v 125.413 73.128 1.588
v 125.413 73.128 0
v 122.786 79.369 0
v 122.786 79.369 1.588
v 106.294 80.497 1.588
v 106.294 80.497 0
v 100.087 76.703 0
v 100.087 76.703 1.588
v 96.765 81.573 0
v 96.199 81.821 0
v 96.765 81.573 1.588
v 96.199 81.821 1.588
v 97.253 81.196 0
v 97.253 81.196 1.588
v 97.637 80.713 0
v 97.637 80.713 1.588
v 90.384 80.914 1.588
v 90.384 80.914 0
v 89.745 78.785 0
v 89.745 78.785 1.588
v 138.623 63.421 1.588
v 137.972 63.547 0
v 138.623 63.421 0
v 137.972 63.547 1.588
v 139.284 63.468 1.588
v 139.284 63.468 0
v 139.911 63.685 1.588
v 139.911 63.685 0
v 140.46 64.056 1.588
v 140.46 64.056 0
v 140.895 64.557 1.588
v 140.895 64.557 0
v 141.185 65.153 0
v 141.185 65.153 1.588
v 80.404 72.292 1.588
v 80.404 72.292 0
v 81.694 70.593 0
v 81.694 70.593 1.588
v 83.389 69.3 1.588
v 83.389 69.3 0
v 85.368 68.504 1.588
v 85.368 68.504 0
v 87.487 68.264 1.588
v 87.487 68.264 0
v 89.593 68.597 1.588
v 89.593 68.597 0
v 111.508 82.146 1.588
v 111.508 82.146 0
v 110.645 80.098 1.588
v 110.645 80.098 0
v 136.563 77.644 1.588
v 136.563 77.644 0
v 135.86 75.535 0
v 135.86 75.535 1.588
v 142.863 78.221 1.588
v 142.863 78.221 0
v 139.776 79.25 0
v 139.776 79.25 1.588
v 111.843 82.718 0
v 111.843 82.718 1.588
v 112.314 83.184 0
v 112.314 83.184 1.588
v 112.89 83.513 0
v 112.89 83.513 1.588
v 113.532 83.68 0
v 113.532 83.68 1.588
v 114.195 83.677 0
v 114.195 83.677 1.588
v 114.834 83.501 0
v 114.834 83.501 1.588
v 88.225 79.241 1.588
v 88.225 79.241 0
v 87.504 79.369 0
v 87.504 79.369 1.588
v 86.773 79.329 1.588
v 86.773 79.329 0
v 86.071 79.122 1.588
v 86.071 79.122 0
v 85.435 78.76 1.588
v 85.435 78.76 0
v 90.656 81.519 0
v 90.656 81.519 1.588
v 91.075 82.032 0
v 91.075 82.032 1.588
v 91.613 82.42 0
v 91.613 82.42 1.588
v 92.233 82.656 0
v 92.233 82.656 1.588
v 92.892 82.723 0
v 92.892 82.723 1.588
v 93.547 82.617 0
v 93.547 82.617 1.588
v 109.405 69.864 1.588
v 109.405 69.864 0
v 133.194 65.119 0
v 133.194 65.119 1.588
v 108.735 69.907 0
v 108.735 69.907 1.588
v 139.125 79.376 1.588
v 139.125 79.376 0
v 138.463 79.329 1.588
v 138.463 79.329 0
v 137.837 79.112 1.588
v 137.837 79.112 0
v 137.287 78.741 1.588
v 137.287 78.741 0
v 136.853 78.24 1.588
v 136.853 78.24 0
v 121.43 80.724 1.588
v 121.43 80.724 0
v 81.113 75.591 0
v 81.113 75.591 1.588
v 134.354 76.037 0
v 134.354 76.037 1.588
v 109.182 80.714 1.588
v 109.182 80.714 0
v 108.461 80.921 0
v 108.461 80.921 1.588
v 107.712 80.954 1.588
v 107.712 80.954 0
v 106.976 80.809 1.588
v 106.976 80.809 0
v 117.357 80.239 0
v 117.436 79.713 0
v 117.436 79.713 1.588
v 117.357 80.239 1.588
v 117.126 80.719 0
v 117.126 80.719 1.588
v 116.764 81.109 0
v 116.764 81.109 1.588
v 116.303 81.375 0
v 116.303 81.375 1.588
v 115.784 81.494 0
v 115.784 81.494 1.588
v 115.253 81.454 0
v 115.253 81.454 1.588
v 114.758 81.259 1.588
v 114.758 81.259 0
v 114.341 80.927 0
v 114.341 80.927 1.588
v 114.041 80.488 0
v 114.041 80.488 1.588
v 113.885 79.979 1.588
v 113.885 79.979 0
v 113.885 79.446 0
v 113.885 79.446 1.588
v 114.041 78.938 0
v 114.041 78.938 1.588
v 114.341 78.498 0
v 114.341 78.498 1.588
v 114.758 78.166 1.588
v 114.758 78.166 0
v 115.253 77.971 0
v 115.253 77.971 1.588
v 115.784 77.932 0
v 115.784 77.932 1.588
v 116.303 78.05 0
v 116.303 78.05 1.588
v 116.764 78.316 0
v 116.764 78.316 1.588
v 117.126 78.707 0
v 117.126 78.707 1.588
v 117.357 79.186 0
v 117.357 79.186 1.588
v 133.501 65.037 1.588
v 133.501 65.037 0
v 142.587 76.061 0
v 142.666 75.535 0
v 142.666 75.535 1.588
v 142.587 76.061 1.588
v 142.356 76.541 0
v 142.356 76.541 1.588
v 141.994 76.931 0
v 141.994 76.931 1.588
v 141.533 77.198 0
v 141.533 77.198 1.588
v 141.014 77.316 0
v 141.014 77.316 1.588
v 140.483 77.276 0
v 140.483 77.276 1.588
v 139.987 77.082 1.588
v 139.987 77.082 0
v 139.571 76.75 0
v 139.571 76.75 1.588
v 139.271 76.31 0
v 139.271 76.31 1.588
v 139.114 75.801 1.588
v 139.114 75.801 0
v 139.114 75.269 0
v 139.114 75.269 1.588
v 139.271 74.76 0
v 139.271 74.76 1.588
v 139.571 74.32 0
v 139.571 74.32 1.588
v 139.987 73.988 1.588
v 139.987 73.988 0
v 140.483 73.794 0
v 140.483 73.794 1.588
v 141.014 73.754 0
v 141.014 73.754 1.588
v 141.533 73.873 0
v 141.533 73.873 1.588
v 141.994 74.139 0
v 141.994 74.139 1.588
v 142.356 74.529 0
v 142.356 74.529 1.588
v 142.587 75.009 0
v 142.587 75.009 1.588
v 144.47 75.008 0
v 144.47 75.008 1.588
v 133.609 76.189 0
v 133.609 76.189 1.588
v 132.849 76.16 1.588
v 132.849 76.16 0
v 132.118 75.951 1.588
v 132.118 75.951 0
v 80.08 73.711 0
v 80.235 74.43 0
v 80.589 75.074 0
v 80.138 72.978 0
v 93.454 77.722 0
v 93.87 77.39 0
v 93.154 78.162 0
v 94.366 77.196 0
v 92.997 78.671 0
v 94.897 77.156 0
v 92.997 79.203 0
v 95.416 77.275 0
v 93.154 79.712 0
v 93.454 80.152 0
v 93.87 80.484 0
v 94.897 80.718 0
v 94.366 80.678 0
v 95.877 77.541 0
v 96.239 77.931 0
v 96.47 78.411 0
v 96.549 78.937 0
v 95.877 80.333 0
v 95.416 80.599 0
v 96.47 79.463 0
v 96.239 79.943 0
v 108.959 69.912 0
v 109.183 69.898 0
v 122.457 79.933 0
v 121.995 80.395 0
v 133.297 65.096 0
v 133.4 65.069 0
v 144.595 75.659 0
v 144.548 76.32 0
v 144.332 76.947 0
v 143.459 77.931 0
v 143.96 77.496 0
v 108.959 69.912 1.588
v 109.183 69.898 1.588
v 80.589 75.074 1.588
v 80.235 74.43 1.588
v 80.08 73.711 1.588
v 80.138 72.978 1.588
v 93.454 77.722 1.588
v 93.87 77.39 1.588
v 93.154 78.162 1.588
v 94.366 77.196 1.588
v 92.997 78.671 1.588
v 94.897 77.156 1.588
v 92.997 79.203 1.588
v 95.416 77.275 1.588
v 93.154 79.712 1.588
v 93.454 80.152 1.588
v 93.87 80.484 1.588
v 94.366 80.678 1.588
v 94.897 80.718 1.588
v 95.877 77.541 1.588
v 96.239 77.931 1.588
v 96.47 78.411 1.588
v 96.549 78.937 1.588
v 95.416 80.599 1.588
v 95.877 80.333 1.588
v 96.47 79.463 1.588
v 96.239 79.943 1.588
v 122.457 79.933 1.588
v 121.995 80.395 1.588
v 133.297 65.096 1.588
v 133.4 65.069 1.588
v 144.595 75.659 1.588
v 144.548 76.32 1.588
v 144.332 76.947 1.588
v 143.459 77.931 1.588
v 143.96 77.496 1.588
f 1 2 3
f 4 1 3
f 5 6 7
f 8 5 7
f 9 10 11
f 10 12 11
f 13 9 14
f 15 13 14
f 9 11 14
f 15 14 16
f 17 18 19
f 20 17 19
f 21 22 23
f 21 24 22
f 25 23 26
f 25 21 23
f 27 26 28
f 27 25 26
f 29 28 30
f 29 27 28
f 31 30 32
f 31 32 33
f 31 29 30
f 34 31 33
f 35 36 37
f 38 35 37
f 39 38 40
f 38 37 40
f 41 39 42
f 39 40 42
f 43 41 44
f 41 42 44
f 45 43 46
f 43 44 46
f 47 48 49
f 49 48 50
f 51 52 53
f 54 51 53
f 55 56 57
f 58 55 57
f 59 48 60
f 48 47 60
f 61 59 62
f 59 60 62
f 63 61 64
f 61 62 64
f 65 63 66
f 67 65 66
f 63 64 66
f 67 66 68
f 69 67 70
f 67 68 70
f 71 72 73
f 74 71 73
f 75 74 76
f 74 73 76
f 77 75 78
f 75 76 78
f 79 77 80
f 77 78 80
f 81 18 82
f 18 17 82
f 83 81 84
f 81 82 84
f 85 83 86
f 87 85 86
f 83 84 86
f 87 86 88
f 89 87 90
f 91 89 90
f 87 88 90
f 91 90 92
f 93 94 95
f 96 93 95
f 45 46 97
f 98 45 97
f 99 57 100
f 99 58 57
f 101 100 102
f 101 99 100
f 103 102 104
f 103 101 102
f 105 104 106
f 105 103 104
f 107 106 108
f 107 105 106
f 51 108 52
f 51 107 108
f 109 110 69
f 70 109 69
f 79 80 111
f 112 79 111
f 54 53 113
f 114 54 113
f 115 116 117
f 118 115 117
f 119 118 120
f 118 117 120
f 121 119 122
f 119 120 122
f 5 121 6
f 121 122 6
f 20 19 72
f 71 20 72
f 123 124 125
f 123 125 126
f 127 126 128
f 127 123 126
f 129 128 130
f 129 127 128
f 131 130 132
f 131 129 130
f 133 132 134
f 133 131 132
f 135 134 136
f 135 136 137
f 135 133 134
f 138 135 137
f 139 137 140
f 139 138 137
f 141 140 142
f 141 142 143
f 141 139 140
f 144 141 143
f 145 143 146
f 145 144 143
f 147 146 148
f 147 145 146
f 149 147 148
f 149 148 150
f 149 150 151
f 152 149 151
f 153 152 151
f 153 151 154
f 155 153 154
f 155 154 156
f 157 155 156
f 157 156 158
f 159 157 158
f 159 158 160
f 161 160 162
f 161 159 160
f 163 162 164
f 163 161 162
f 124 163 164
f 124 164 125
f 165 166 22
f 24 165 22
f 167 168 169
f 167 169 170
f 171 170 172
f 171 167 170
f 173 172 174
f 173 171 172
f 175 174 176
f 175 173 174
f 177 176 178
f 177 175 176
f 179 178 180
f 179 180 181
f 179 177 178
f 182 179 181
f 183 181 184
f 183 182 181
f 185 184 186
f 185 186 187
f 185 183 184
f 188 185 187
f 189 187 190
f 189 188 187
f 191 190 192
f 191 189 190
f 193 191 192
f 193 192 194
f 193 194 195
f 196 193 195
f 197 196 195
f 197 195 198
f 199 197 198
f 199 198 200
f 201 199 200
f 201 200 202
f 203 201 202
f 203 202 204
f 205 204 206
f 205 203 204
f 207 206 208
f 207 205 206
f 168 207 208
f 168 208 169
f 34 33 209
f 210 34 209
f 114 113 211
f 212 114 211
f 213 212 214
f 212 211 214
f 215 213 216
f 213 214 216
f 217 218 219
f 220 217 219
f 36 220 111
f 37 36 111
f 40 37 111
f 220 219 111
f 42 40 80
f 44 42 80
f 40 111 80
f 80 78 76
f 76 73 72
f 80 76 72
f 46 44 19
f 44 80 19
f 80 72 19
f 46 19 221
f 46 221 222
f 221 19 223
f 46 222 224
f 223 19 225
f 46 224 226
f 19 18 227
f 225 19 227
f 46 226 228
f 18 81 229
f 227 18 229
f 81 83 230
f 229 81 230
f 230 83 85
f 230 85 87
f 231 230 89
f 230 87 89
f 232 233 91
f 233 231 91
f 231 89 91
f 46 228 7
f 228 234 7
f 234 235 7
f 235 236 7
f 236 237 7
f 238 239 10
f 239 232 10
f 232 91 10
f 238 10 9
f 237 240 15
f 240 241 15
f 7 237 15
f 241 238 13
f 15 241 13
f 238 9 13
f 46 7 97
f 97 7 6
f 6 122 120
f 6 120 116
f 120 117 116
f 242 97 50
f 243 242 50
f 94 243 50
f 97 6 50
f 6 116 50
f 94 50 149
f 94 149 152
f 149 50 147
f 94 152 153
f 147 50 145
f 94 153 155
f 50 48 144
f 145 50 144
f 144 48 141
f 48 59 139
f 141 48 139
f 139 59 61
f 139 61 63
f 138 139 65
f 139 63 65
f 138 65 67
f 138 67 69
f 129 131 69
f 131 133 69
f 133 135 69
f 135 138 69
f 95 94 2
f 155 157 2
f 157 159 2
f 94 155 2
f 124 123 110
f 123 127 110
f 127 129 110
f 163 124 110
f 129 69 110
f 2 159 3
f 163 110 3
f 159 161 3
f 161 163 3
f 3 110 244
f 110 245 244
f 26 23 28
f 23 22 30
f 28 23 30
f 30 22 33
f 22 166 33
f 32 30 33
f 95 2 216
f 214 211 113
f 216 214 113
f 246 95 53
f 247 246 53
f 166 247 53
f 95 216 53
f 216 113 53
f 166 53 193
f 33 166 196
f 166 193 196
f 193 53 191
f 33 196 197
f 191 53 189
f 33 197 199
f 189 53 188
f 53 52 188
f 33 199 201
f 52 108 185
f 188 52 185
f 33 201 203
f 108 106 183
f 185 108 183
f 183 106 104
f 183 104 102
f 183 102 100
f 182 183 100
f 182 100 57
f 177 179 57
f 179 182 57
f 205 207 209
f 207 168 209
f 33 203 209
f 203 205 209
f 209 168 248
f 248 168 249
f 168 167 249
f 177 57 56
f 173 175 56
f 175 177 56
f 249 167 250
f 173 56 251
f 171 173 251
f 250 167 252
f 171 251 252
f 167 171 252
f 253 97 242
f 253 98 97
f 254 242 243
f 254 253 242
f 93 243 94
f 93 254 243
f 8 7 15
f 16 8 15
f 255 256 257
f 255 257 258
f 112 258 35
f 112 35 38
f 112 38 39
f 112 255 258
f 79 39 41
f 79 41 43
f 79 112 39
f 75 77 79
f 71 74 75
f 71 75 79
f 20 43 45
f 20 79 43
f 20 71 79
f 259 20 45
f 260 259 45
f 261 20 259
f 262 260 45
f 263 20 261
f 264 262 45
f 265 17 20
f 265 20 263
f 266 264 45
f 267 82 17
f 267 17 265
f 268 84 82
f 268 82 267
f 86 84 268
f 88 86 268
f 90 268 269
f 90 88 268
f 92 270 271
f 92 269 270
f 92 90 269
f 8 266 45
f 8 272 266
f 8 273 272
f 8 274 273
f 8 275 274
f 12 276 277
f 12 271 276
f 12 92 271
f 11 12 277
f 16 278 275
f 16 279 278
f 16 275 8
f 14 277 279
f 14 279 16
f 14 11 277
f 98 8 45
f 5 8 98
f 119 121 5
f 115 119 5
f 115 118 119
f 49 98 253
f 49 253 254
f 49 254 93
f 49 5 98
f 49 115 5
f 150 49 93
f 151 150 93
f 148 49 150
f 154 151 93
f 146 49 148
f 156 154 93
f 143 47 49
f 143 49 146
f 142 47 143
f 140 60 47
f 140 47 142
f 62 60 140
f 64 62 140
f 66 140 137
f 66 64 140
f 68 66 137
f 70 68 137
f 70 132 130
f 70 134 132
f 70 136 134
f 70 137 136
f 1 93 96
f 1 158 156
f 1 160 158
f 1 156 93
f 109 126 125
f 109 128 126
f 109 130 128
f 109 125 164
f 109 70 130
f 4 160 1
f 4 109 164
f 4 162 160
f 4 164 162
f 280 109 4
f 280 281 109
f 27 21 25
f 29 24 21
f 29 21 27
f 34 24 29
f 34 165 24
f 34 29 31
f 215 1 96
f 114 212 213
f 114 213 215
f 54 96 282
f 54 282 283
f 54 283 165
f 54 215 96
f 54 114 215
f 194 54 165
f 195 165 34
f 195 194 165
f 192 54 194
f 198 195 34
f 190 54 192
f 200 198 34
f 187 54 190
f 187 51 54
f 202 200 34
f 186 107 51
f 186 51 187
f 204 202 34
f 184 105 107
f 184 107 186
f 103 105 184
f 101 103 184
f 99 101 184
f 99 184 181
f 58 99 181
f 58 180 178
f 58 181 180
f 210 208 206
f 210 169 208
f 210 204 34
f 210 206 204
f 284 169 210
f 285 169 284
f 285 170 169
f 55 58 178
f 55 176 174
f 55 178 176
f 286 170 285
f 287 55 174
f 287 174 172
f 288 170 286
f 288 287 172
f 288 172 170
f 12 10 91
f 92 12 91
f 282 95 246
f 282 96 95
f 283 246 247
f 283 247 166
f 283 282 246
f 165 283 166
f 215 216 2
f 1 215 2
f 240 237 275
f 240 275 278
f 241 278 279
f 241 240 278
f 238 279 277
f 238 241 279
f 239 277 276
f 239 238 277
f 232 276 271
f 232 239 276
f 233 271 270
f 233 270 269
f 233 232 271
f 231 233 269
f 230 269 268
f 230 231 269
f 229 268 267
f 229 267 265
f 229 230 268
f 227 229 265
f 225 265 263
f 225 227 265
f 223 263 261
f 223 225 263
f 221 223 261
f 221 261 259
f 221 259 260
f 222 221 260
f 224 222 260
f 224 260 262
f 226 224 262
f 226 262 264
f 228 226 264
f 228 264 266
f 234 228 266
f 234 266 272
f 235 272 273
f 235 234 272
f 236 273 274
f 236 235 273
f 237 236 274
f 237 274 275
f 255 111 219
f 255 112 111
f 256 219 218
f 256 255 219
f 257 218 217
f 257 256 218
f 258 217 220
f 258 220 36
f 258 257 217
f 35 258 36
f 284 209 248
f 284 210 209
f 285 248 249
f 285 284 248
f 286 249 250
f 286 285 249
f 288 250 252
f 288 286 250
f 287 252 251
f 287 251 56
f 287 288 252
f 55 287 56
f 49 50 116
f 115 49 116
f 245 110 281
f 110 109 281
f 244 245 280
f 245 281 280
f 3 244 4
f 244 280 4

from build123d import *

# Parameters (mm, degrees)
SKETCH5_R           = 1.7859375
BOSS_EXTRUDE1_DEPTH = 1.5875
FILLET1_R           = 2.54


with BuildPart() as part:
    # Sketch5 → Boss-Extrude1 (new body)
    with BuildSketch(Plane.XY):
        with BuildLine():
            Line((89.745378764, 78.784933687), (88.224829537, 79.241098456))
            ThreePointArc((88.224829537, 79.241098456), (86.773324607, 79.32888397), (85.434920368, 78.760335862))
            Line((85.434920368, 78.760335862), (79.568453922, 74.458260468))
            ThreePointArc((79.568453922, 74.458260468), (83.306311174, 69.347675041), (89.593323842, 68.597253861))
            Line((89.593323842, 68.597253861), (109.072532015, 69.929775894))
            Line((109.072532015, 69.929775894), (133.35, 65.0875))
            Line((133.35, 65.0875), (140.381467098, 62.743677634))
            Line((140.381467098, 62.743677634), (145.272774991, 77.417601312))
            Line((145.272774991, 77.417601312), (137.366092628, 80.0531621))
            Line((137.366092628, 80.0531621), (135.860057893, 75.535057893))
            Line((135.860057893, 75.535057893), (134.354023157, 76.037069471))
            ThreePointArc((134.354023157, 76.037069471), (133.228154551, 76.197661136), (132.117919025, 75.951192316))
            Line((132.117919025, 75.951192316), (125.413170132, 73.128140151))
            Line((125.413170132, 73.128140151), (122.383992203, 80.322437731))
            Line((122.383992203, 80.322437731), (112.493298596, 84.486940303))
            Line((112.493298596, 84.486940303), (110.645177133, 80.097651828))
            Line((110.645177133, 80.097651828), (109.182080975, 80.713692316))
            ThreePointArc((109.182080975, 80.713692316), (107.712055506, 80.953571291), (106.29439622, 80.496669822))
            Line((106.29439622, 80.496669822), (100.08690833, 76.703205))
            Line((100.08690833, 76.703205), (97.130029166, 81.541734542))
            Line((97.130029166, 81.541734542), (91.113873069, 83.346581371))
            Line((91.113873069, 83.346581371), (89.745378764, 78.784933687))
        make_face()
        with Locations((140.880173678, 75.535057893)):
            Circle(SKETCH5_R, mode=Mode.SUBTRACT)
        with Locations((115.650506095, 79.712626524)):
            Circle(SKETCH5_R, mode=Mode.SUBTRACT)
        with Locations((94.763191216, 78.93698861)):
            Circle(SKETCH5_R, mode=Mode.SUBTRACT)
    extrude(amount=BOSS_EXTRUDE1_DEPTH)

    # Fillet1
    fillet1_edges = [part.edges().sort_by_distance(p)[0] for p in [
        (109.072532015, 69.929775894, 0.79375),
        (79.568453922, 74.458260468, 0.79375),
        (91.113873069, 83.346581371, 0.79375),
        (97.130029166, 81.541734542, 0.79375),
        (112.493298596, 84.486940303, 0.79375),
        (122.383992203, 80.322437731, 0.79375),
        (137.366092628, 80.0531621, 0.79375),
        (145.272774991, 77.417601312, 0.79375),
        (140.381467098, 62.743677634, 0.79375),
        (133.35, 65.0875, 0.79375),
    ]]
    fillet(fillet1_edges, radius=FILLET1_R)


solid = part.part
